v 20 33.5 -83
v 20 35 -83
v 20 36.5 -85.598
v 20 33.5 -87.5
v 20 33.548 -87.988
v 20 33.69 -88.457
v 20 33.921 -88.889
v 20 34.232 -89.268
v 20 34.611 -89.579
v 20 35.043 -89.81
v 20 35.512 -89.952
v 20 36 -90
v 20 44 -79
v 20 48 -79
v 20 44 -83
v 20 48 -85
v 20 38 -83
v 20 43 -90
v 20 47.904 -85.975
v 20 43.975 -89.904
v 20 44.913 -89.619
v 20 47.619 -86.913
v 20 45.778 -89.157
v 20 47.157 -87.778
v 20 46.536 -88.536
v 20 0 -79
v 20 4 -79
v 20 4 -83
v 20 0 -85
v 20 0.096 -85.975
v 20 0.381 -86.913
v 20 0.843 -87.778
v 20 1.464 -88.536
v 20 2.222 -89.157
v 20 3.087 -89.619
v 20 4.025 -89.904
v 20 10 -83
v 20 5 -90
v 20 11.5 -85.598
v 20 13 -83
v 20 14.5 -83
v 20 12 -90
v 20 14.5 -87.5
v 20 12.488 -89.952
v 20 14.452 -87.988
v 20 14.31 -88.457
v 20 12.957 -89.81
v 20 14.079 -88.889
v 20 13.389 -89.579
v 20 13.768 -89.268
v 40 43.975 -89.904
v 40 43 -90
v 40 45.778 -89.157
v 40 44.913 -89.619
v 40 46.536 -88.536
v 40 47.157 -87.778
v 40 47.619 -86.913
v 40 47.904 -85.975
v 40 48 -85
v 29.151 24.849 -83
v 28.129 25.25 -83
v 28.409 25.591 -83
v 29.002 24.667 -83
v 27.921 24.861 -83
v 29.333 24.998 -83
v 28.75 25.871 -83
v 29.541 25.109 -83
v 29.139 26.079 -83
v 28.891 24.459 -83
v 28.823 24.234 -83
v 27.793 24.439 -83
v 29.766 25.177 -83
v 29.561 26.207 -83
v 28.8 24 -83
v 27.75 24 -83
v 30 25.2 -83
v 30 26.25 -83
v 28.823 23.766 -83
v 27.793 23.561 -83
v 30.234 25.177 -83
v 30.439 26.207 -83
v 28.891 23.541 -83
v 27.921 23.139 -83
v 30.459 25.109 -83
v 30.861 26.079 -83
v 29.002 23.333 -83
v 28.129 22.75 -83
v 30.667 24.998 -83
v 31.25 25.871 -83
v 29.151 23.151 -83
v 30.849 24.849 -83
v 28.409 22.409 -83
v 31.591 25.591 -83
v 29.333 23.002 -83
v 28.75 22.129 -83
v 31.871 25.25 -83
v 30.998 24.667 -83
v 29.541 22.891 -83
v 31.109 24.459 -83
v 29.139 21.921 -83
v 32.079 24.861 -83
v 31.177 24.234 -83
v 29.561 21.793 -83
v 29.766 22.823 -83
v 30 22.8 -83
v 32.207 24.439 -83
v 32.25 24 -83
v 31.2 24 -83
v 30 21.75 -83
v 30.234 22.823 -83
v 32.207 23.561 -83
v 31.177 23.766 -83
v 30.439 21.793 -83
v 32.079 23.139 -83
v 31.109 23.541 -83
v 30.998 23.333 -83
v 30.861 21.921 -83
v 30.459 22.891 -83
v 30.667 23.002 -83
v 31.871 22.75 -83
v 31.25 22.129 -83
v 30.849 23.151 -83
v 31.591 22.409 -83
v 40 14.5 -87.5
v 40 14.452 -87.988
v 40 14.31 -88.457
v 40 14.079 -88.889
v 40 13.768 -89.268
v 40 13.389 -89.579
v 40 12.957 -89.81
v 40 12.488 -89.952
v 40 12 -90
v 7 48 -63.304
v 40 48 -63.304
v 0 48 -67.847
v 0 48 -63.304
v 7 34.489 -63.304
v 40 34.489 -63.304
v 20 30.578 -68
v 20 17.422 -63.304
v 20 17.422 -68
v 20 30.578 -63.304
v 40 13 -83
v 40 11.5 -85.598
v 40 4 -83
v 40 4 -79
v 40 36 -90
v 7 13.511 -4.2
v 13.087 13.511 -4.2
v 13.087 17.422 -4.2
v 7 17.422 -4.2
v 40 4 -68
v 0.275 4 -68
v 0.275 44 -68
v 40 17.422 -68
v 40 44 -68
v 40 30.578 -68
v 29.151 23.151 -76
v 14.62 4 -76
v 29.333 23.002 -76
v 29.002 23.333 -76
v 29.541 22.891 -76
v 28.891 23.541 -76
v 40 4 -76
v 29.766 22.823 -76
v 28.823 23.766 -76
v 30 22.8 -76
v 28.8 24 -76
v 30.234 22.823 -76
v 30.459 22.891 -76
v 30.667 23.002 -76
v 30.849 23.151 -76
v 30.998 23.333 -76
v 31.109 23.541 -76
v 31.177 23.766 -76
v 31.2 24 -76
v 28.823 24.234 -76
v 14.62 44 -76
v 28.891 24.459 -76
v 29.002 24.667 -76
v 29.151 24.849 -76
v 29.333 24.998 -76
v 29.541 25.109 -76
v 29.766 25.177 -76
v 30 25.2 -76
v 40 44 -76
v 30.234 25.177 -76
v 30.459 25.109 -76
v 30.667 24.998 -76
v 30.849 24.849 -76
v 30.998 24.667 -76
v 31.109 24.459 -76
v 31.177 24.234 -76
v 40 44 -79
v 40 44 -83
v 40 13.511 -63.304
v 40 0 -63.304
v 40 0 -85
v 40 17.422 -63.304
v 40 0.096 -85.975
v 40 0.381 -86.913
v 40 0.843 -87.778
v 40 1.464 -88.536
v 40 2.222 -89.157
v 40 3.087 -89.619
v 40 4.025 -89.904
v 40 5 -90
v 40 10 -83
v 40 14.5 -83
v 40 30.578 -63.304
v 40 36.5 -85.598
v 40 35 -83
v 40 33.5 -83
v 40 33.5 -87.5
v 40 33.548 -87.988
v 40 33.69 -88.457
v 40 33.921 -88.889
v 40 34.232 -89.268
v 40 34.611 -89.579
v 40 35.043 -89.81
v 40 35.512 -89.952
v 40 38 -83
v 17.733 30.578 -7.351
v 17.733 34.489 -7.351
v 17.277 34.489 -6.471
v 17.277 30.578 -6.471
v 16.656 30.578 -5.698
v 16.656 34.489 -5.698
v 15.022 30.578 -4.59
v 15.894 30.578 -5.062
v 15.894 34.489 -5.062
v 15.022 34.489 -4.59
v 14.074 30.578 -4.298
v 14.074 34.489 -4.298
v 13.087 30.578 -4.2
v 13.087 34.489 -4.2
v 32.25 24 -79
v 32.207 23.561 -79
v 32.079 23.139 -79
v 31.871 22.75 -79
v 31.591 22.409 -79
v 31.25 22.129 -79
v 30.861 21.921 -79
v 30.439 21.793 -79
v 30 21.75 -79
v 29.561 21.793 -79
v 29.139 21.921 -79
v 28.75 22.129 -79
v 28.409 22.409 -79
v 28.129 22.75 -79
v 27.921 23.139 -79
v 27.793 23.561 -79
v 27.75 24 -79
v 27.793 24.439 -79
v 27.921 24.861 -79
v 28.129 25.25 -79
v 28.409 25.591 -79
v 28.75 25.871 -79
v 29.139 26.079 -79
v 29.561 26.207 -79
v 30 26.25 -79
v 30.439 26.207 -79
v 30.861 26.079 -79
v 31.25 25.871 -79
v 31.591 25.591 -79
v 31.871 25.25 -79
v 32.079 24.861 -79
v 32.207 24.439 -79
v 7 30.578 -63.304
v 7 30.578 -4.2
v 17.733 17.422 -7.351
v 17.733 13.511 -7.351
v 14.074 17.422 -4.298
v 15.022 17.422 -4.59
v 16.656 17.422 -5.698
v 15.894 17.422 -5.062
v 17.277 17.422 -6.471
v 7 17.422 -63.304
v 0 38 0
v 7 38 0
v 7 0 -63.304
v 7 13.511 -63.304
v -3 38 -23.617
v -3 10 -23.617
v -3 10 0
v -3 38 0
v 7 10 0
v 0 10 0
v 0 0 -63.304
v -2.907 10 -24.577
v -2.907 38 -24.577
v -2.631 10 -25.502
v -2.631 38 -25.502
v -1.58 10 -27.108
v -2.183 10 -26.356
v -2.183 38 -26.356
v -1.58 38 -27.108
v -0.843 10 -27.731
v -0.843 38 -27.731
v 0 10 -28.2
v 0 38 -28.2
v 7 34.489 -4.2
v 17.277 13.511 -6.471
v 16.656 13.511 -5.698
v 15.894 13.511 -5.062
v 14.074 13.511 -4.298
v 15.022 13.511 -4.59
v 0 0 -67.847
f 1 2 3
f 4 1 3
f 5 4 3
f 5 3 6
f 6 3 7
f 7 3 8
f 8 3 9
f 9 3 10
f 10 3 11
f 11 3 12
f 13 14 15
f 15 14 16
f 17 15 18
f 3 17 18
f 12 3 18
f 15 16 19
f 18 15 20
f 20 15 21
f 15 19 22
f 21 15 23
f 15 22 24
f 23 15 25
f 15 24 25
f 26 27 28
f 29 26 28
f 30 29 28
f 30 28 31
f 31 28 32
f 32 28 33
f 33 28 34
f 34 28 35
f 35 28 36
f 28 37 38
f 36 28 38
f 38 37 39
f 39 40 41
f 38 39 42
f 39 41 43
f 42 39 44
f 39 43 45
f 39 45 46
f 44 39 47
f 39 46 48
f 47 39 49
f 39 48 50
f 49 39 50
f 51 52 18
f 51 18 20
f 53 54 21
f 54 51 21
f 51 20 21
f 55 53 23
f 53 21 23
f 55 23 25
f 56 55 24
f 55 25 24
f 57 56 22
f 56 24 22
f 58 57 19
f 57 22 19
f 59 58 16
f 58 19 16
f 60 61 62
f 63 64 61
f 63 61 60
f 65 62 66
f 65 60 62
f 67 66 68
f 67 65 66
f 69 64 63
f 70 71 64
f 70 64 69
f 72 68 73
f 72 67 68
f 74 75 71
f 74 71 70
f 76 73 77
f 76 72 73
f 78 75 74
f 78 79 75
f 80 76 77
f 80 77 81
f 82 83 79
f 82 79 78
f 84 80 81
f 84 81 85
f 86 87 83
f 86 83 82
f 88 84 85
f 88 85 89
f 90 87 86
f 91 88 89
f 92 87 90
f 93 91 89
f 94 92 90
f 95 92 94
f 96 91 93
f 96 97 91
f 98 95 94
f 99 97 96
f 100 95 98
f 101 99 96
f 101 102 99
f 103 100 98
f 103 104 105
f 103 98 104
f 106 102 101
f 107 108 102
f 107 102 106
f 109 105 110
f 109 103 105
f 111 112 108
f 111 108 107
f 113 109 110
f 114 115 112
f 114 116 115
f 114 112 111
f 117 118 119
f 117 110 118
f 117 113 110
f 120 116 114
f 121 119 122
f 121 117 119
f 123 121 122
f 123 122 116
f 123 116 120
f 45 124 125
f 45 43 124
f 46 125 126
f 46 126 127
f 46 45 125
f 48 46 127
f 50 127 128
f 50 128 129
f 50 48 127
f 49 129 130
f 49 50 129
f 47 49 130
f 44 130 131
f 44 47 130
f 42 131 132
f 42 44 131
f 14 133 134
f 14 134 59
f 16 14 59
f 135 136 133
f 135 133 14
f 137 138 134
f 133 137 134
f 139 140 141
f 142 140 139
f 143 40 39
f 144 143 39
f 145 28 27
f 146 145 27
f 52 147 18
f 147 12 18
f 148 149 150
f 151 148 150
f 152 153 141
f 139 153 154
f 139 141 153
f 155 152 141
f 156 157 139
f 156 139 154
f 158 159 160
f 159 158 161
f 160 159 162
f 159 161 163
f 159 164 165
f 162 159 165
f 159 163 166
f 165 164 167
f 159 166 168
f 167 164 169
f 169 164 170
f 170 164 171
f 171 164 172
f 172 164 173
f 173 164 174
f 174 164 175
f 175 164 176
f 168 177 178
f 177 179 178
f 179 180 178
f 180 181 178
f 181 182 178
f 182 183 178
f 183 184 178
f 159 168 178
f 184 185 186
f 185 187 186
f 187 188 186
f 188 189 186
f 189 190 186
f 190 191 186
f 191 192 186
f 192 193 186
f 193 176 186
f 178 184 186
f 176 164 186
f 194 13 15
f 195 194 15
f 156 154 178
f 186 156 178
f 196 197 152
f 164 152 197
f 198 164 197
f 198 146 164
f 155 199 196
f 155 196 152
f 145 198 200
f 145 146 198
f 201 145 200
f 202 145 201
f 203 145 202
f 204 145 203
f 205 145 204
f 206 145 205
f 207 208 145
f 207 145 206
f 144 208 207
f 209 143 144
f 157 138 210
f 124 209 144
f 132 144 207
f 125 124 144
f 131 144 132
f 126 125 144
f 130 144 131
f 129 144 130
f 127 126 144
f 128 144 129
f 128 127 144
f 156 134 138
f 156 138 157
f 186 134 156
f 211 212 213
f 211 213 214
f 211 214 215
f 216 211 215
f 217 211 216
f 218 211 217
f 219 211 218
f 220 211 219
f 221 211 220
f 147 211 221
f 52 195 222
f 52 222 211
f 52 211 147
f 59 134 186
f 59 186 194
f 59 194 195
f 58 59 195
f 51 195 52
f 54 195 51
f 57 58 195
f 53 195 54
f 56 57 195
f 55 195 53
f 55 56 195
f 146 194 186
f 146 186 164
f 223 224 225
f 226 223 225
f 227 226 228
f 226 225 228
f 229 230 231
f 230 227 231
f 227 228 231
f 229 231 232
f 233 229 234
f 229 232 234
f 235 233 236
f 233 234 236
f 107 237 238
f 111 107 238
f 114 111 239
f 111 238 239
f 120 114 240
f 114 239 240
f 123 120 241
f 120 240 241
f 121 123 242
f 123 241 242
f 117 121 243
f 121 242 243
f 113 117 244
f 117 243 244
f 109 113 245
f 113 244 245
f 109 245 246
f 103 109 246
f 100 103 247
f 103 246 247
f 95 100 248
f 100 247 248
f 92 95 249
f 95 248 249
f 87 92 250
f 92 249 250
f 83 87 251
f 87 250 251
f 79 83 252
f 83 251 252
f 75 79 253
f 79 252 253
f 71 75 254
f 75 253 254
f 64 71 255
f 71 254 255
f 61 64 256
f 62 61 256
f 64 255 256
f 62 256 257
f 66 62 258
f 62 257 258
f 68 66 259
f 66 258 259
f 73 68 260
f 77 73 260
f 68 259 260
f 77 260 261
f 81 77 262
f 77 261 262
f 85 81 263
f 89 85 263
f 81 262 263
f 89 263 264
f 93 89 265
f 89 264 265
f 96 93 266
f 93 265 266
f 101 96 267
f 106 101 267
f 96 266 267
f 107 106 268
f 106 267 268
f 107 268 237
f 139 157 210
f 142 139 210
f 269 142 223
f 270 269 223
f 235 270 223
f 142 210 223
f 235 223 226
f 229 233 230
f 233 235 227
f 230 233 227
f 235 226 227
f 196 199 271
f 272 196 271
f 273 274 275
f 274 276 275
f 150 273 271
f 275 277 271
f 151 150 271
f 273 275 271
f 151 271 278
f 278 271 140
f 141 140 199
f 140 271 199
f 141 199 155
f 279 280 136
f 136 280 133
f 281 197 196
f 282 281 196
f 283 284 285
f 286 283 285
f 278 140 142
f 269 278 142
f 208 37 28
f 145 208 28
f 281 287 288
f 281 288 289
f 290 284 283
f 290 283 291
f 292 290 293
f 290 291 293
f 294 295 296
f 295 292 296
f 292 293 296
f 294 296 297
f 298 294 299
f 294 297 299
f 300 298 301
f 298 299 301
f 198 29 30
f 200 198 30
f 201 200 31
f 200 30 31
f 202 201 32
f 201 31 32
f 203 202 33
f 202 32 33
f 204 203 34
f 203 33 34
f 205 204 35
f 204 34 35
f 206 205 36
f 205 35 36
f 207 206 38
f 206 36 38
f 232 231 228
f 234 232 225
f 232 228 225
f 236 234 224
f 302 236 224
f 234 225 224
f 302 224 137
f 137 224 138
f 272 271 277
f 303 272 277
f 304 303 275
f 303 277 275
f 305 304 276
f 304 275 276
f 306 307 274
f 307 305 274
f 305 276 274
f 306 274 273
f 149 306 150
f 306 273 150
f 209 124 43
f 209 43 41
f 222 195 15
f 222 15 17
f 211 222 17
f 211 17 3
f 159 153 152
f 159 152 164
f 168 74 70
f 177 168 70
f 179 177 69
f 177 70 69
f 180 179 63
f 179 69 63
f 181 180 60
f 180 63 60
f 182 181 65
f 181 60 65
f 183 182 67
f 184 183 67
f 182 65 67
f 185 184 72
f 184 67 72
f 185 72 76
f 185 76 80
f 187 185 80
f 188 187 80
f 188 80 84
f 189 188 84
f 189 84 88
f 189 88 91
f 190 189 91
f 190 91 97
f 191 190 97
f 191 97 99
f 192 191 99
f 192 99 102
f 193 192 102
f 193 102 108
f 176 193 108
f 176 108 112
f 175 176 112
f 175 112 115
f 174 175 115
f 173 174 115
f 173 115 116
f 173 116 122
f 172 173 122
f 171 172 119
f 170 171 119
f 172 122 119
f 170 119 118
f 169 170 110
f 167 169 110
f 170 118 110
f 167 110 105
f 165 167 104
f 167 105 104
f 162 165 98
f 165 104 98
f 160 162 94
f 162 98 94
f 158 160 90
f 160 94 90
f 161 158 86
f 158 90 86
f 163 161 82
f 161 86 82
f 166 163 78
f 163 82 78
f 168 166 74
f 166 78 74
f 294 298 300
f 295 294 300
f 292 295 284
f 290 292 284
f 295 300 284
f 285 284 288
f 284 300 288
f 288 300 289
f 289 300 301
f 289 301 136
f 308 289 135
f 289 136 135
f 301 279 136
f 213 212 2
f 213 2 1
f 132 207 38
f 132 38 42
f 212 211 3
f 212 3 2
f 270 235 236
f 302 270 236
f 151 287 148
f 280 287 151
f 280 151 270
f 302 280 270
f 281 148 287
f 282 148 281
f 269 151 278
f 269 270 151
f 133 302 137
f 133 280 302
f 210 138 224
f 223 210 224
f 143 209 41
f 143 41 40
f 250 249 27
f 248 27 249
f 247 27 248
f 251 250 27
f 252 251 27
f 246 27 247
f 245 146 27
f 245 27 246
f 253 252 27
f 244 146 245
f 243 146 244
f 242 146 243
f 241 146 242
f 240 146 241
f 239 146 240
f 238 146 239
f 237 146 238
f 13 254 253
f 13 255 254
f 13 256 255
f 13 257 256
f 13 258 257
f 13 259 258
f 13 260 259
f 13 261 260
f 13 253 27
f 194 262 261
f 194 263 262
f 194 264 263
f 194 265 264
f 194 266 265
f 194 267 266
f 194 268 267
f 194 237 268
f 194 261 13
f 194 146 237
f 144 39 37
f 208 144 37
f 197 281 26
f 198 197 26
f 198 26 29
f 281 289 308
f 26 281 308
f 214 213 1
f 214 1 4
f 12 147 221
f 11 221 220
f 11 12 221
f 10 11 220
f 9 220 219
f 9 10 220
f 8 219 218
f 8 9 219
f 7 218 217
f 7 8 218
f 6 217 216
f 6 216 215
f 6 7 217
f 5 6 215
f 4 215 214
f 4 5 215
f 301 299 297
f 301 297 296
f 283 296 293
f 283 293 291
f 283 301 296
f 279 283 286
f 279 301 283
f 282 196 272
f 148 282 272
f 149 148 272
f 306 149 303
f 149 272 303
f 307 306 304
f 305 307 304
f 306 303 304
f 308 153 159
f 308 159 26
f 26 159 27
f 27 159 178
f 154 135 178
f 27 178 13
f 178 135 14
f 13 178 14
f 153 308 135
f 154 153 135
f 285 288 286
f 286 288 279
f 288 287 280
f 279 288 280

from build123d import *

# Parameters (mm, degrees)
SKETCH_1_W          = 90
SKETCH_1_H          = 48
EXTRUDE_1_DEPTH     = 40
CUT_EXTRUDE_1_DEPTH = 40
CUT_EXTRUDE_2_DEPTH = 110.562767398
CUT_EXTRUDE_3_DEPTH = 110.562767398
CUT_EXTRUDE_4_DEPTH = 33
SKETCH_6_W          = 8
SKETCH_6_H          = 40
CUT_EXTRUDE_5_DEPTH = 110.562767398
SKETCH_7_W          = 20
SKETCH_7_H          = 13.155555556
CUT_EXTRUDE_6_DEPTH = 5
SKETCH_8_W          = 28.2
SKETCH_8_H          = 28
EXTRUDE_2_DEPTH     = 3
SKETCH_9_R          = 2.25
EXTRUDE_3_DEPTH     = 4
SKETCH_10_R         = 1.2
CUT_EXTRUDE_7_DEPTH = 104.889364229
FILLET_1_R          = 5
FILLET_2_R          = 2.5


with BuildPart() as part:
    # 스케치1 → 보스-돌출1 (new body)
    with BuildSketch(Plane(origin=(0, 0, 0), x_dir=(0, 0, -1), z_dir=(1, 0, 0))):
        with Locations((45, 24)):
            Rectangle(SKETCH_1_W, SKETCH_1_H)
    extrude(amount=EXTRUDE_1_DEPTH)

    # 스케치2 → 컷-돌출1 (cut)
    with BuildSketch(Plane(origin=(40, 0, 0), x_dir=(0, 0, -1), z_dir=(1, 0, 0))):
        Polygon((79, 44), (83, 44), (83, 38), (85.598076211, 36.5), (83, 35), (83, 33.5), (90, 33.5), (90, 14.5), (83, 14.5), (83, 13), (85.598076211, 11.5), (83, 10), (83, 4), (79, 4), align=None)
        Polygon((0, 38), (63.304035288, 48), (0, 48), align=None)
        Polygon((0, 10), (63.304035288, 0), (0, 0), align=None)
    extrude(amount=-CUT_EXTRUDE_1_DEPTH, mode=Mode.SUBTRACT)

    # 스케치3 → 컷-돌출2 (cut, through all)
    with BuildSketch(Plane(origin=(0, 48, 0), x_dir=(1, 0, 0), z_dir=(0, 1, 0))):
        Polygon((0, 67.846768337), (20, 79), (20, 90), (0, 90), align=None)
    extrude(amount=-CUT_EXTRUDE_2_DEPTH, mode=Mode.SUBTRACT)

    # 스케치4 → 컷-돌출3 (cut, through all)
    with BuildSketch(Plane(origin=(0, 48, 0), x_dir=(1, 0, 0), z_dir=(0, 1, 0))):
        Polygon((40, 63.304035288), (14.807552651, 0), (40, 0), align=None)
    extrude(amount=-CUT_EXTRUDE_3_DEPTH, mode=Mode.SUBTRACT)

    # 스케치5 → 컷-돌출4 (cut)
    with BuildSketch(Plane(origin=(40, 0, 0), x_dir=(0, 0, -1), z_dir=(1, 0, 0))):
        Polygon((4.2, 34.488888889), (63.304035288, 34.488888889), (63.304035288, 48), (0, 38), (0, 10), (63.304035288, 0), (63.304035288, 13.511111111), (4.2, 13.511111111), (4.2, 17.422222222), (63.304035288, 17.422222222), (63.304035288, 30.577777778), (4.2, 30.577777778), align=None)
    extrude(amount=-CUT_EXTRUDE_4_DEPTH, mode=Mode.SUBTRACT)

    # 스케치6 → 컷-돌출5 (cut, through all)
    with BuildSketch(Plane(origin=(40, 0, 0), x_dir=(0, 0, -1), z_dir=(1, 0, 0))):
        with Locations((72, 24)):
            Rectangle(SKETCH_6_W, SKETCH_6_H)
    extrude(amount=-CUT_EXTRUDE_5_DEPTH, mode=Mode.SUBTRACT)

    # 스케치7 → 컷-돌출6 (cut)
    with BuildSketch(Plane.XY.offset(-63.304035288)):
        with Locations((30, 24)):
            Rectangle(SKETCH_7_W, SKETCH_7_H)
    extrude(amount=-CUT_EXTRUDE_6_DEPTH, mode=Mode.SUBTRACT)

    # 스케치8 → 보스-돌출2 (add)
    with BuildSketch(Plane.ZY):
        with Locations((-14.1, 24)):
            Rectangle(SKETCH_8_W, SKETCH_8_H)
    extrude(amount=EXTRUDE_2_DEPTH)

    # 스케치9 → 보스-돌출3 (add)
    with BuildSketch(Plane(origin=(0, 0, -79), x_dir=(-1, 0, 0), z_dir=(0, 0, -1))):
        with Locations(Location((-30, 24, 0), (0, 0, 180))):
            Circle(SKETCH_9_R)
    extrude(amount=EXTRUDE_3_DEPTH)

    # 스케치10 → 컷-돌출7 (cut, through all)
    with BuildSketch(Plane(origin=(0, 0, -83), x_dir=(-1, 0, 0), z_dir=(0, 0, -1))):
        with Locations((-30, 24)):
            Circle(SKETCH_10_R)
    extrude(amount=-CUT_EXTRUDE_7_DEPTH, mode=Mode.SUBTRACT)

    # 필렛1
    # the kernel refuses this fillet: 5 mm, written as the material it takes off along each edge
    with BuildSketch(Plane(origin=(-3, 49.456439237, -28.2), x_dir=(1, 0, 0), z_dir=(0, -1, 0))) as fillet_1_piece_1:
        with BuildLine():
            CenterArc((5, 4.582575695), FILLET_1_R, 180, 66.421821522)
            Line((0, 4.582575695), (-0.1, 4.582575695))
            Line((-0.1, 4.582575695), (-0.1, 0))
            Line((-0.1, 0), (0, -0.1))
            ThreePointArc((0, -0.1), (1.5, -0.1), (2.96, -0.091651514))
            Line((2.96, -0.091651514), (3, 0))
        make_face()
    extrude(amount=50.912878475, mode=Mode.SUBTRACT)
    with BuildSketch(Plane(origin=(16.47898289, 25.901187913, -4.2), x_dir=(0.36975577982440216, 0, -0.9291289809743576), z_dir=(0, -1, 0)), Plane(origin=(16.47898289, 42.96785458, -4.2), x_dir=(0.36975577982440216, 0, -0.9291289809743576), z_dir=(0, -1, 0))) as fillet_1_piece_2:
        with BuildLine():
            CenterArc((FILLET_1_R * 0.67831725528, -FILLET_1_R), FILLET_1_R, 90, 68.299443615)
            Line((-FILLET_1_R * 0.250811725694, -FILLET_1_R * 0.630244220176), (-FILLET_1_R * 0.269394305314, -FILLET_1_R * 0.622849104579))
            Line((-FILLET_1_R * 0.269394305314, -FILLET_1_R * 0.622849104579), (-FILLET_1_R * 0.0135663451056, FILLET_1_R * 0.02))
            Line((-FILLET_1_R * 0.0135663451056, FILLET_1_R * 0.02), (FILLET_1_R * 0.67831725528, FILLET_1_R * 0.02))
            Line((FILLET_1_R * 0.67831725528, FILLET_1_R * 0.02), (FILLET_1_R * 0.67831725528, 0))
        make_face()
    extrude(amount=20.869042493, mode=Mode.SUBTRACT)
    with BuildSketch(Plane(origin=(7.5, 0, -90), x_dir=(0, 0, 1), z_dir=(1, 0, 0))) as fillet_1_piece_3:
        with BuildLine():
            CenterArc((FILLET_1_R, -FILLET_1_R), FILLET_1_R, 90, 90)
            Line((0, -FILLET_1_R), (-FILLET_1_R * 0.02, -FILLET_1_R))
            Line((-FILLET_1_R * 0.02, -FILLET_1_R), (-FILLET_1_R * 0.02, FILLET_1_R * 0.02))
            Line((-FILLET_1_R * 0.02, FILLET_1_R * 0.02), (FILLET_1_R, FILLET_1_R * 0.02))
            Line((FILLET_1_R, FILLET_1_R * 0.02), (FILLET_1_R, 0))
        make_face()
    extrude(amount=45, mode=Mode.SUBTRACT)
    with BuildSketch(Plane(origin=(7.5, 48, -90), x_dir=(0, 0, 1), z_dir=(1, 0, 0))) as fillet_1_piece_4:
        with BuildLine():
            CenterArc((FILLET_1_R, FILLET_1_R), FILLET_1_R, 180, 90)
            Line((0, FILLET_1_R), (-FILLET_1_R * 0.02, FILLET_1_R))
            Line((-FILLET_1_R * 0.02, FILLET_1_R), (-FILLET_1_R * 0.02, -FILLET_1_R * 0.02))
            Line((-FILLET_1_R * 0.02, -FILLET_1_R * 0.02), (FILLET_1_R, -FILLET_1_R * 0.02))
            Line((FILLET_1_R, -FILLET_1_R * 0.02), (FILLET_1_R, 0))
        make_face()
    extrude(amount=45, mode=Mode.SUBTRACT)

    # 필렛2
    fillet_2_edges = [part.edges().sort_by_distance(p)[0] for p in [
        (30, 14.5, -90),
        (30, 33.5, -90),
    ]]
    fillet(fillet_2_edges, radius=FILLET_2_R)


solid = part.part
